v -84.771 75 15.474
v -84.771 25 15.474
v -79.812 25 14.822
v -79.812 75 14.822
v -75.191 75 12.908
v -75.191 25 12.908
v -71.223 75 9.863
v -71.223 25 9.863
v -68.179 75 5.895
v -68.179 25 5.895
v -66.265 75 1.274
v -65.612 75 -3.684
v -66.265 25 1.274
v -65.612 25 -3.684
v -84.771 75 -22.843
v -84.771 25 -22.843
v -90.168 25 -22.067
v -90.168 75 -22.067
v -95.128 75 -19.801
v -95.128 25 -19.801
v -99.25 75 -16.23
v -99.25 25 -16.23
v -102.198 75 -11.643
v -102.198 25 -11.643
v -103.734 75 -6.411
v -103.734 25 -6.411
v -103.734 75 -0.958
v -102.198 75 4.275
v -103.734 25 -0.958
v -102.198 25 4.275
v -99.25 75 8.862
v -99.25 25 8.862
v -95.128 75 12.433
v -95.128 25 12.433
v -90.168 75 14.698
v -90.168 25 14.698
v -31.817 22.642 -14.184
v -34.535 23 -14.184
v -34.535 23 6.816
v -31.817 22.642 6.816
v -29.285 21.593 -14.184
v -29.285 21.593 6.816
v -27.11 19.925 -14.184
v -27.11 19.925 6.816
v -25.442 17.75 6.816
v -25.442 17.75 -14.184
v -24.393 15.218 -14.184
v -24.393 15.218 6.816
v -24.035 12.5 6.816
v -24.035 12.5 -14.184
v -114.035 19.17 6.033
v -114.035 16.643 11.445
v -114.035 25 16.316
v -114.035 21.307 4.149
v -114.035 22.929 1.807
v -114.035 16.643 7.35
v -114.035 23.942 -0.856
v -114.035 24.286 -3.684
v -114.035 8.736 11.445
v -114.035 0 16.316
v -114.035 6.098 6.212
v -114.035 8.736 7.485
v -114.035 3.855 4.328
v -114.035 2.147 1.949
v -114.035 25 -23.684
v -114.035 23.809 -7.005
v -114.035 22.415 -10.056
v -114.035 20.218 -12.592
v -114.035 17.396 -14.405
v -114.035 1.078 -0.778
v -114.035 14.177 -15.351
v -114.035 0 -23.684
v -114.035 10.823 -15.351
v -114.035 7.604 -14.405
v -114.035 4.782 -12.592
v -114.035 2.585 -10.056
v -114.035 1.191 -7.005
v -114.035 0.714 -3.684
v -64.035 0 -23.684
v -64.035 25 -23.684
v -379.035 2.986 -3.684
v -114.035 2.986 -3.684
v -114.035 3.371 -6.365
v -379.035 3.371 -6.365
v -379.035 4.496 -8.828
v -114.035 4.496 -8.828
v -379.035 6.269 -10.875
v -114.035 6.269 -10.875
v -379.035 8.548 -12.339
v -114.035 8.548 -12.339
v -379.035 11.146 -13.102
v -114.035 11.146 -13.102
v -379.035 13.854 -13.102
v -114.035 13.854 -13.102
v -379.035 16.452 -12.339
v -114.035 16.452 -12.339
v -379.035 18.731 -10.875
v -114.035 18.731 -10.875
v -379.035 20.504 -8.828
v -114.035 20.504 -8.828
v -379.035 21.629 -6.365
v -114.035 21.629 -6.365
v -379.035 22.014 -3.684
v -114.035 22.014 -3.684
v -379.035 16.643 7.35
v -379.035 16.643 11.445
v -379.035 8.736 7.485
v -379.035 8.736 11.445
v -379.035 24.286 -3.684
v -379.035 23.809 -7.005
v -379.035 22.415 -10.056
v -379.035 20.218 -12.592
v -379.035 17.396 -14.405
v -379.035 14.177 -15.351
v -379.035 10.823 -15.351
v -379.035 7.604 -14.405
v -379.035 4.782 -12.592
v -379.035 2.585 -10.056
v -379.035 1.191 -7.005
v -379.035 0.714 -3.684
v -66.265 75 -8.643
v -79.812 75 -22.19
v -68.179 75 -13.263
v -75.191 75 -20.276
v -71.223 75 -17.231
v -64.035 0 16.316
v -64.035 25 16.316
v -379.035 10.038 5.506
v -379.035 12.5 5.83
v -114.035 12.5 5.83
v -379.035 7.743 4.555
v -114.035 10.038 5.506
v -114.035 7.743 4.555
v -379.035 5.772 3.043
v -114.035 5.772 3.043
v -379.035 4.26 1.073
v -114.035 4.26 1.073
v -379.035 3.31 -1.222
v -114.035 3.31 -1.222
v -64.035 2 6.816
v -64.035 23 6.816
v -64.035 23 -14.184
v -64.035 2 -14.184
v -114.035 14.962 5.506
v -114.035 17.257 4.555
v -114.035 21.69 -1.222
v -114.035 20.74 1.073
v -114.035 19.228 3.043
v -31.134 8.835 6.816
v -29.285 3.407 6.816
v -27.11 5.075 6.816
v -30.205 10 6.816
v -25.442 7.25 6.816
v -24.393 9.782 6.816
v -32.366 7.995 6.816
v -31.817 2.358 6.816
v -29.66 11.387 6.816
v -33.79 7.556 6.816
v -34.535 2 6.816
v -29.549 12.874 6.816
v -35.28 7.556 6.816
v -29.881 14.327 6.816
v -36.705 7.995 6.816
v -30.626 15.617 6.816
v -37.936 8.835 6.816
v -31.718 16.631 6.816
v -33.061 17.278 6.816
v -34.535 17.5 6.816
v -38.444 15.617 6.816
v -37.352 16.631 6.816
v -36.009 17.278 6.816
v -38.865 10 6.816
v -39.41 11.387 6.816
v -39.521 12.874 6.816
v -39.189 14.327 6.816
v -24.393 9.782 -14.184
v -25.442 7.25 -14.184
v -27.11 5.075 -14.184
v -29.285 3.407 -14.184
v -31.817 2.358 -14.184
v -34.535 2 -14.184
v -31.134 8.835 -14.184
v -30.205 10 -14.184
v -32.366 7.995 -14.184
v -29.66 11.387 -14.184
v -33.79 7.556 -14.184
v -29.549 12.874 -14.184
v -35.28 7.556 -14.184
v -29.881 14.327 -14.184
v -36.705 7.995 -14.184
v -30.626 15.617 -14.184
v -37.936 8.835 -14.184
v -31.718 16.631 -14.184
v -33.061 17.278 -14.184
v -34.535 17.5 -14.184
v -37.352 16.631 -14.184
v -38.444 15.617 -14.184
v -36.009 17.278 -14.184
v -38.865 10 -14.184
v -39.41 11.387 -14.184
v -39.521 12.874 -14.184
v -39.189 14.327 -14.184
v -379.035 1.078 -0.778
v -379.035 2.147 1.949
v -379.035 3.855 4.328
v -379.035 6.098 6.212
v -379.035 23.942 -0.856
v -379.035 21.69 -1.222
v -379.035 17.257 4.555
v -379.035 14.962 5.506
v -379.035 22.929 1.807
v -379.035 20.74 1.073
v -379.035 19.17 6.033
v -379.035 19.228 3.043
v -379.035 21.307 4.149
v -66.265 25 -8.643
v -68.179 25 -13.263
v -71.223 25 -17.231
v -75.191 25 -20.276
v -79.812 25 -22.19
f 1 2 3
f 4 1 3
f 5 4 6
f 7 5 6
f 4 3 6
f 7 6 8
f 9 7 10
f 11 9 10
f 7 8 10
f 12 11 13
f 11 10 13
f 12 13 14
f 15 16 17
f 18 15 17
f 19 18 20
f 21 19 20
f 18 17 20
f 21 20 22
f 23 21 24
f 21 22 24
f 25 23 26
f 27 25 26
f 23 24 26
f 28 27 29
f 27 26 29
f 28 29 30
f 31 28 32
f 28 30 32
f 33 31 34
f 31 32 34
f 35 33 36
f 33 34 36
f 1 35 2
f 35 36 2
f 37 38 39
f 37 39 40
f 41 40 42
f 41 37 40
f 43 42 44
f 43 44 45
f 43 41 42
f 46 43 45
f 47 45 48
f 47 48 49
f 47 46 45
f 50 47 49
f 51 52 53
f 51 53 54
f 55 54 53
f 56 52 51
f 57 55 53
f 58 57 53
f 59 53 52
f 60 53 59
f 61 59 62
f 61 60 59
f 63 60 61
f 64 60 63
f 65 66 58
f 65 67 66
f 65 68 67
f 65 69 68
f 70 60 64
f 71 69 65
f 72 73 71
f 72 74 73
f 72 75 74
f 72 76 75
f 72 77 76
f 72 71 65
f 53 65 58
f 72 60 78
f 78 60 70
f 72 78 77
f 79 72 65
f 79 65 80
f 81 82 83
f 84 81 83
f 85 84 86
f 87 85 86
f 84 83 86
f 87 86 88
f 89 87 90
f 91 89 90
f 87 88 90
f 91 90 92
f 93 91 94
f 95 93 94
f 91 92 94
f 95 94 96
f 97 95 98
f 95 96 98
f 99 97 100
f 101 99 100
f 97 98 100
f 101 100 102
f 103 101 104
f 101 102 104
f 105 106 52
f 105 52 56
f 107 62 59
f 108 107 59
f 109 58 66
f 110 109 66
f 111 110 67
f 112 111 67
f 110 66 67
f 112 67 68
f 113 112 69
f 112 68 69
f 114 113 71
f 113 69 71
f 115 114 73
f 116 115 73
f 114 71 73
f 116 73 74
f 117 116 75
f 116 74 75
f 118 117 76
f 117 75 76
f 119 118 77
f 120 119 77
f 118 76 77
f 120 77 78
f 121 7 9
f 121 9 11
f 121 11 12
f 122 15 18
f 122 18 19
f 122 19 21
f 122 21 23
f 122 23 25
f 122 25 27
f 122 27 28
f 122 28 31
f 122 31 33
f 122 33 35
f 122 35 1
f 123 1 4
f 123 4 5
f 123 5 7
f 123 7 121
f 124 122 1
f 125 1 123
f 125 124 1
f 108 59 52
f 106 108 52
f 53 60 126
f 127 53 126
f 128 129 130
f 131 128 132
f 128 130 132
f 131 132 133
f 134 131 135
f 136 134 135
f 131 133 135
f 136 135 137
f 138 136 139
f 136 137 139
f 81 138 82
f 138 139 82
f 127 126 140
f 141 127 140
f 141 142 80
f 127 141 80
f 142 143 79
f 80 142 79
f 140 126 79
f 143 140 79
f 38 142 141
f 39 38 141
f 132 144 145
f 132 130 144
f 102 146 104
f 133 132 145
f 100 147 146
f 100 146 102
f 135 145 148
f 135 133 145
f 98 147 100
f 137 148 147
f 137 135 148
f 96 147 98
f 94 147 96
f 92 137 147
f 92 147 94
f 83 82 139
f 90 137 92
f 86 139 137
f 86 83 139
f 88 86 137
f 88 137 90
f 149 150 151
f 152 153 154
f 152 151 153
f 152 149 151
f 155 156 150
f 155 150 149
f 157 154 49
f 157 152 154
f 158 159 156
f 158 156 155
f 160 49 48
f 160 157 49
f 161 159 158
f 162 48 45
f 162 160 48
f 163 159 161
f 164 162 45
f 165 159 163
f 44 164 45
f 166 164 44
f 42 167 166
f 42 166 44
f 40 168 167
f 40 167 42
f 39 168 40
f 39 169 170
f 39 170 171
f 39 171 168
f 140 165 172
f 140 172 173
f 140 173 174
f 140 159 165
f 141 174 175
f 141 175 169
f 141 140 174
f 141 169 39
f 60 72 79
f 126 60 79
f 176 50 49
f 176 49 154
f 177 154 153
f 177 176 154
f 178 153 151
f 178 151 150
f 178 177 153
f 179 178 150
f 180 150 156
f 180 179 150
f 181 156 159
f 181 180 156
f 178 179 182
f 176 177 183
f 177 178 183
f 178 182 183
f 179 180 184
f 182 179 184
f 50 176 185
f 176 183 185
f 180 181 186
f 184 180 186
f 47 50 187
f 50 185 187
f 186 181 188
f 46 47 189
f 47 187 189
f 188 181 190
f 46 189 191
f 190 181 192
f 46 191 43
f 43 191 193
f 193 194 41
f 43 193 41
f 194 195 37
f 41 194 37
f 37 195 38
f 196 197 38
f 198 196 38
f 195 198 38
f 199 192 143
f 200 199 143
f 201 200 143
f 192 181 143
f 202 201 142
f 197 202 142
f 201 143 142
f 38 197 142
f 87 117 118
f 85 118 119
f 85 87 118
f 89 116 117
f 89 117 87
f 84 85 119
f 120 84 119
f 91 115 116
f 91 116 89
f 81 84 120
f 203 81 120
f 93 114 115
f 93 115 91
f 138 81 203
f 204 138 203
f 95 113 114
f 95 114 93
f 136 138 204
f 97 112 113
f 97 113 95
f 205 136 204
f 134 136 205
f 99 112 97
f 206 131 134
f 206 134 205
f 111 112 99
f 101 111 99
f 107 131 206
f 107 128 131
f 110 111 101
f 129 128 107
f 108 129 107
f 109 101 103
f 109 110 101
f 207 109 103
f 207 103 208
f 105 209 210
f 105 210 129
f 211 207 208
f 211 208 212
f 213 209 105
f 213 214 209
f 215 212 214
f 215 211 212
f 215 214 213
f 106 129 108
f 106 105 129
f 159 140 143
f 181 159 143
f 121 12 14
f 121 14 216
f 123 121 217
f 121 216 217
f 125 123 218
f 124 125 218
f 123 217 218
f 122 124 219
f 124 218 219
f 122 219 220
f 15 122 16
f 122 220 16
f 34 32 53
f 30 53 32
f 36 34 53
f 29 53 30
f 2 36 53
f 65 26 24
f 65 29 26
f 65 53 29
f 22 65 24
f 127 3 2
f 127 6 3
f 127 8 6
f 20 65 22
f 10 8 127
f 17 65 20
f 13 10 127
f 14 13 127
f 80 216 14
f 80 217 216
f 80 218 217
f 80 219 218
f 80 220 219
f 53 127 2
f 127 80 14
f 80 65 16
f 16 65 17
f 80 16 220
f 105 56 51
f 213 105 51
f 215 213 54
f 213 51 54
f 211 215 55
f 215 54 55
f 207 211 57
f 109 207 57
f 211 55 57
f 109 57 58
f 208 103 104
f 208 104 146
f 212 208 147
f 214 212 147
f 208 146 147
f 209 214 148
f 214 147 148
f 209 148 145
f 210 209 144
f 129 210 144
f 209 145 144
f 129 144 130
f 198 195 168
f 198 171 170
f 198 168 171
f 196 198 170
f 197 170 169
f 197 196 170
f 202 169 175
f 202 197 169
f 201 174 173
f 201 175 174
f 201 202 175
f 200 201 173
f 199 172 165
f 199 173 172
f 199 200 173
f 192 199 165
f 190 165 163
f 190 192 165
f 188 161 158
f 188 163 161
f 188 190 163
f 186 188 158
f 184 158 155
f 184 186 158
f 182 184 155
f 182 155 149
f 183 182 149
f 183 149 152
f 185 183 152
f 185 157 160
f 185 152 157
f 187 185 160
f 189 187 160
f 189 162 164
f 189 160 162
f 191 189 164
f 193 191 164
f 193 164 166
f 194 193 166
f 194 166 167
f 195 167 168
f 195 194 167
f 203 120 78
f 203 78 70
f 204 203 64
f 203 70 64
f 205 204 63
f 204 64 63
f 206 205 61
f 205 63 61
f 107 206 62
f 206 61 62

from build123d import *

# Parameters (mm, degrees)
SKETCH1_W               = 50
SKETCH1_H               = 40
BOSS_EXTRUDE1_DEPTH     = 25
BOSS_EXTRUDE2_DEPTH     = 50
BOSS_EXTRUDE3_DEPTH     = 265
SKETCH4_W               = 10.5
SKETCH4_H               = 21
BOSS_EXTRUDE4_DEPTH     = 40
CUT_EXTRUDE3_DEPTH      = 388.585923019
CUT_EXTRUDE3_DEPTH_BACK = 25
SKETCH5_R               = 5


with BuildPart() as part:
    # Sketch1 → Boss-Extrude1 (new body)
    with BuildSketch(Plane(origin=(0, 0, 0), x_dir=(1, 0, 0), z_dir=(0, 1, 0))):
        with Locations((-89.035087719, 3.684210526)):
            Rectangle(SKETCH1_W, SKETCH1_H)
    extrude(amount=BOSS_EXTRUDE1_DEPTH)

    # Sketch2 → Boss-Extrude2 (add)
    with BuildSketch(Plane(origin=(0, 25, 0), x_dir=(1, 0, 0), z_dir=(0, 1, 0))):
        with BuildLine():
            ThreePointArc((-65.611981025, 3.684210526), (-71.223390651, 17.231351748), (-84.770531873, 22.842761374))
            Line((-84.770531873, 22.842761374), (-84.770531873, -15.474340321))
            ThreePointArc((-84.770531873, -15.474340321), (-71.223390651, -9.862930696), (-65.611981025, 3.684210526))
        make_face()
        with BuildLine():
            Line((-84.770531873, -15.474340321), (-84.770531873, 22.842761374))
            ThreePointArc((-84.770531873, 22.842761374), (-103.929082721, 3.684210526), (-84.770531873, -15.474340321))
        make_face()
    extrude(amount=BOSS_EXTRUDE2_DEPTH)

    # Sketch3 → Boss-Extrude3 (add)
    with BuildSketch(Plane.ZY.offset(114.035087719)):
        with BuildLine():
            Line((-3.684210526, 22.014273548), (-3.684210526, 24.28635832))
            ThreePointArc((-3.684210526, 24.28635832), (-15.470568846, 12.5), (-3.684210526, 0.71364168))
            Line((-3.684210526, 0.71364168), (-3.684210526, 2.985726452))
            ThreePointArc((-3.684210526, 2.985726452), (-13.198484074, 12.5), (-3.684210526, 22.014273548))
        make_face()
        with BuildLine():
            ThreePointArc((7.349913455, 16.643229465), (3.027147584, 22.188958394), (-3.684210526, 24.28635832))
            Line((-3.684210526, 24.28635832), (-3.684210526, 22.014273548))
            ThreePointArc((-3.684210526, 22.014273548), (3.043396817, 19.227607344), (5.830063022, 12.5))
            Line((5.830063022, 12.5), (5.830063022, 16.643229465))
            Line((5.830063022, 16.643229465), (7.349913455, 16.643229465))
        make_face()
        with BuildLine():
            ThreePointArc((8.102147793, 12.5), (7.912564487, 14.605481352), (7.349913455, 16.643229465))
            Line((7.349913455, 16.643229465), (5.830063022, 16.643229465))
            Line((5.830063022, 16.643229465), (5.830063022, 12.5))
            Line((5.830063022, 12.5), (5.830063022, 8.73562524))
            Line((5.830063022, 8.73562524), (7.484841587, 8.73562524))
            ThreePointArc((7.484841587, 8.73562524), (7.946797442, 10.592673056), (8.102147793, 12.5))
        make_face()
        with BuildLine():
            Line((-3.684210526, 2.985726452), (-3.684210526, 0.71364168))
            ThreePointArc((-3.684210526, 0.71364168), (3.191470264, 2.926951577), (7.484841587, 8.73562524))
            Line((7.484841587, 8.73562524), (5.830063022, 8.73562524))
            Line((5.830063022, 8.73562524), (5.830063022, 12.5))
            ThreePointArc((5.830063022, 12.5), (3.043396817, 5.772392656), (-3.684210526, 2.985726452))
        make_face()
        with BuildLine():
            Line((11.445254796, 16.643229465), (7.349913455, 16.643229465))
            ThreePointArc((7.349913455, 16.643229465), (7.912564487, 14.605481352), (8.102147793, 12.5))
            ThreePointArc((8.102147793, 12.5), (7.946797442, 10.592673056), (7.484841587, 8.73562524))
            Line((7.484841587, 8.73562524), (11.445254796, 8.73562524))
            Line((11.445254796, 8.73562524), (11.445254796, 16.643229465))
        make_face()
    extrude(amount=BOSS_EXTRUDE3_DEPTH)

    # Sketch4 → Boss-Extrude4 (add)
    with BuildSketch(Plane(origin=(-64.035087719, 0, 0), x_dir=(0, 0, -1), z_dir=(1, 0, 0))):
        with Locations((-1.565789474, 12.5)):
            Rectangle(SKETCH4_W, SKETCH4_H)
        with Locations((8.934210526, 12.5)):
            Rectangle(SKETCH4_W, SKETCH4_H)
    extrude(amount=BOSS_EXTRUDE4_DEPTH)

    # Sketch5 → Cut-Extrude3 (cut, two sides: drawn at the far end of the back side and taken through both)
    with BuildSketch(Plane.XY.offset(6.815789474).offset(-CUT_EXTRUDE3_DEPTH_BACK)):
        with BuildLine():
            Line((-24.035087719, 23), (-34.535087719, 23))
            ThreePointArc((-34.535087719, 23), (-27.110466517, 19.924621202), (-24.035087719, 12.5))
            Line((-24.035087719, 12.5), (-24.035087719, 23))
        make_face()
        with BuildLine():
            Line((-24.035087719, 2), (-24.035087719, 12.5))
            ThreePointArc((-24.035087719, 12.5), (-27.110466517, 5.075378798), (-34.535087719, 2))
            Line((-34.535087719, 2), (-24.035087719, 2))
        make_face()
        with Locations(Location((-34.535087719, 12.5, 0), (0, 0, 90))):
            Circle(SKETCH5_R)
    extrude(amount=CUT_EXTRUDE3_DEPTH + CUT_EXTRUDE3_DEPTH_BACK, mode=Mode.SUBTRACT)


solid = part.part
